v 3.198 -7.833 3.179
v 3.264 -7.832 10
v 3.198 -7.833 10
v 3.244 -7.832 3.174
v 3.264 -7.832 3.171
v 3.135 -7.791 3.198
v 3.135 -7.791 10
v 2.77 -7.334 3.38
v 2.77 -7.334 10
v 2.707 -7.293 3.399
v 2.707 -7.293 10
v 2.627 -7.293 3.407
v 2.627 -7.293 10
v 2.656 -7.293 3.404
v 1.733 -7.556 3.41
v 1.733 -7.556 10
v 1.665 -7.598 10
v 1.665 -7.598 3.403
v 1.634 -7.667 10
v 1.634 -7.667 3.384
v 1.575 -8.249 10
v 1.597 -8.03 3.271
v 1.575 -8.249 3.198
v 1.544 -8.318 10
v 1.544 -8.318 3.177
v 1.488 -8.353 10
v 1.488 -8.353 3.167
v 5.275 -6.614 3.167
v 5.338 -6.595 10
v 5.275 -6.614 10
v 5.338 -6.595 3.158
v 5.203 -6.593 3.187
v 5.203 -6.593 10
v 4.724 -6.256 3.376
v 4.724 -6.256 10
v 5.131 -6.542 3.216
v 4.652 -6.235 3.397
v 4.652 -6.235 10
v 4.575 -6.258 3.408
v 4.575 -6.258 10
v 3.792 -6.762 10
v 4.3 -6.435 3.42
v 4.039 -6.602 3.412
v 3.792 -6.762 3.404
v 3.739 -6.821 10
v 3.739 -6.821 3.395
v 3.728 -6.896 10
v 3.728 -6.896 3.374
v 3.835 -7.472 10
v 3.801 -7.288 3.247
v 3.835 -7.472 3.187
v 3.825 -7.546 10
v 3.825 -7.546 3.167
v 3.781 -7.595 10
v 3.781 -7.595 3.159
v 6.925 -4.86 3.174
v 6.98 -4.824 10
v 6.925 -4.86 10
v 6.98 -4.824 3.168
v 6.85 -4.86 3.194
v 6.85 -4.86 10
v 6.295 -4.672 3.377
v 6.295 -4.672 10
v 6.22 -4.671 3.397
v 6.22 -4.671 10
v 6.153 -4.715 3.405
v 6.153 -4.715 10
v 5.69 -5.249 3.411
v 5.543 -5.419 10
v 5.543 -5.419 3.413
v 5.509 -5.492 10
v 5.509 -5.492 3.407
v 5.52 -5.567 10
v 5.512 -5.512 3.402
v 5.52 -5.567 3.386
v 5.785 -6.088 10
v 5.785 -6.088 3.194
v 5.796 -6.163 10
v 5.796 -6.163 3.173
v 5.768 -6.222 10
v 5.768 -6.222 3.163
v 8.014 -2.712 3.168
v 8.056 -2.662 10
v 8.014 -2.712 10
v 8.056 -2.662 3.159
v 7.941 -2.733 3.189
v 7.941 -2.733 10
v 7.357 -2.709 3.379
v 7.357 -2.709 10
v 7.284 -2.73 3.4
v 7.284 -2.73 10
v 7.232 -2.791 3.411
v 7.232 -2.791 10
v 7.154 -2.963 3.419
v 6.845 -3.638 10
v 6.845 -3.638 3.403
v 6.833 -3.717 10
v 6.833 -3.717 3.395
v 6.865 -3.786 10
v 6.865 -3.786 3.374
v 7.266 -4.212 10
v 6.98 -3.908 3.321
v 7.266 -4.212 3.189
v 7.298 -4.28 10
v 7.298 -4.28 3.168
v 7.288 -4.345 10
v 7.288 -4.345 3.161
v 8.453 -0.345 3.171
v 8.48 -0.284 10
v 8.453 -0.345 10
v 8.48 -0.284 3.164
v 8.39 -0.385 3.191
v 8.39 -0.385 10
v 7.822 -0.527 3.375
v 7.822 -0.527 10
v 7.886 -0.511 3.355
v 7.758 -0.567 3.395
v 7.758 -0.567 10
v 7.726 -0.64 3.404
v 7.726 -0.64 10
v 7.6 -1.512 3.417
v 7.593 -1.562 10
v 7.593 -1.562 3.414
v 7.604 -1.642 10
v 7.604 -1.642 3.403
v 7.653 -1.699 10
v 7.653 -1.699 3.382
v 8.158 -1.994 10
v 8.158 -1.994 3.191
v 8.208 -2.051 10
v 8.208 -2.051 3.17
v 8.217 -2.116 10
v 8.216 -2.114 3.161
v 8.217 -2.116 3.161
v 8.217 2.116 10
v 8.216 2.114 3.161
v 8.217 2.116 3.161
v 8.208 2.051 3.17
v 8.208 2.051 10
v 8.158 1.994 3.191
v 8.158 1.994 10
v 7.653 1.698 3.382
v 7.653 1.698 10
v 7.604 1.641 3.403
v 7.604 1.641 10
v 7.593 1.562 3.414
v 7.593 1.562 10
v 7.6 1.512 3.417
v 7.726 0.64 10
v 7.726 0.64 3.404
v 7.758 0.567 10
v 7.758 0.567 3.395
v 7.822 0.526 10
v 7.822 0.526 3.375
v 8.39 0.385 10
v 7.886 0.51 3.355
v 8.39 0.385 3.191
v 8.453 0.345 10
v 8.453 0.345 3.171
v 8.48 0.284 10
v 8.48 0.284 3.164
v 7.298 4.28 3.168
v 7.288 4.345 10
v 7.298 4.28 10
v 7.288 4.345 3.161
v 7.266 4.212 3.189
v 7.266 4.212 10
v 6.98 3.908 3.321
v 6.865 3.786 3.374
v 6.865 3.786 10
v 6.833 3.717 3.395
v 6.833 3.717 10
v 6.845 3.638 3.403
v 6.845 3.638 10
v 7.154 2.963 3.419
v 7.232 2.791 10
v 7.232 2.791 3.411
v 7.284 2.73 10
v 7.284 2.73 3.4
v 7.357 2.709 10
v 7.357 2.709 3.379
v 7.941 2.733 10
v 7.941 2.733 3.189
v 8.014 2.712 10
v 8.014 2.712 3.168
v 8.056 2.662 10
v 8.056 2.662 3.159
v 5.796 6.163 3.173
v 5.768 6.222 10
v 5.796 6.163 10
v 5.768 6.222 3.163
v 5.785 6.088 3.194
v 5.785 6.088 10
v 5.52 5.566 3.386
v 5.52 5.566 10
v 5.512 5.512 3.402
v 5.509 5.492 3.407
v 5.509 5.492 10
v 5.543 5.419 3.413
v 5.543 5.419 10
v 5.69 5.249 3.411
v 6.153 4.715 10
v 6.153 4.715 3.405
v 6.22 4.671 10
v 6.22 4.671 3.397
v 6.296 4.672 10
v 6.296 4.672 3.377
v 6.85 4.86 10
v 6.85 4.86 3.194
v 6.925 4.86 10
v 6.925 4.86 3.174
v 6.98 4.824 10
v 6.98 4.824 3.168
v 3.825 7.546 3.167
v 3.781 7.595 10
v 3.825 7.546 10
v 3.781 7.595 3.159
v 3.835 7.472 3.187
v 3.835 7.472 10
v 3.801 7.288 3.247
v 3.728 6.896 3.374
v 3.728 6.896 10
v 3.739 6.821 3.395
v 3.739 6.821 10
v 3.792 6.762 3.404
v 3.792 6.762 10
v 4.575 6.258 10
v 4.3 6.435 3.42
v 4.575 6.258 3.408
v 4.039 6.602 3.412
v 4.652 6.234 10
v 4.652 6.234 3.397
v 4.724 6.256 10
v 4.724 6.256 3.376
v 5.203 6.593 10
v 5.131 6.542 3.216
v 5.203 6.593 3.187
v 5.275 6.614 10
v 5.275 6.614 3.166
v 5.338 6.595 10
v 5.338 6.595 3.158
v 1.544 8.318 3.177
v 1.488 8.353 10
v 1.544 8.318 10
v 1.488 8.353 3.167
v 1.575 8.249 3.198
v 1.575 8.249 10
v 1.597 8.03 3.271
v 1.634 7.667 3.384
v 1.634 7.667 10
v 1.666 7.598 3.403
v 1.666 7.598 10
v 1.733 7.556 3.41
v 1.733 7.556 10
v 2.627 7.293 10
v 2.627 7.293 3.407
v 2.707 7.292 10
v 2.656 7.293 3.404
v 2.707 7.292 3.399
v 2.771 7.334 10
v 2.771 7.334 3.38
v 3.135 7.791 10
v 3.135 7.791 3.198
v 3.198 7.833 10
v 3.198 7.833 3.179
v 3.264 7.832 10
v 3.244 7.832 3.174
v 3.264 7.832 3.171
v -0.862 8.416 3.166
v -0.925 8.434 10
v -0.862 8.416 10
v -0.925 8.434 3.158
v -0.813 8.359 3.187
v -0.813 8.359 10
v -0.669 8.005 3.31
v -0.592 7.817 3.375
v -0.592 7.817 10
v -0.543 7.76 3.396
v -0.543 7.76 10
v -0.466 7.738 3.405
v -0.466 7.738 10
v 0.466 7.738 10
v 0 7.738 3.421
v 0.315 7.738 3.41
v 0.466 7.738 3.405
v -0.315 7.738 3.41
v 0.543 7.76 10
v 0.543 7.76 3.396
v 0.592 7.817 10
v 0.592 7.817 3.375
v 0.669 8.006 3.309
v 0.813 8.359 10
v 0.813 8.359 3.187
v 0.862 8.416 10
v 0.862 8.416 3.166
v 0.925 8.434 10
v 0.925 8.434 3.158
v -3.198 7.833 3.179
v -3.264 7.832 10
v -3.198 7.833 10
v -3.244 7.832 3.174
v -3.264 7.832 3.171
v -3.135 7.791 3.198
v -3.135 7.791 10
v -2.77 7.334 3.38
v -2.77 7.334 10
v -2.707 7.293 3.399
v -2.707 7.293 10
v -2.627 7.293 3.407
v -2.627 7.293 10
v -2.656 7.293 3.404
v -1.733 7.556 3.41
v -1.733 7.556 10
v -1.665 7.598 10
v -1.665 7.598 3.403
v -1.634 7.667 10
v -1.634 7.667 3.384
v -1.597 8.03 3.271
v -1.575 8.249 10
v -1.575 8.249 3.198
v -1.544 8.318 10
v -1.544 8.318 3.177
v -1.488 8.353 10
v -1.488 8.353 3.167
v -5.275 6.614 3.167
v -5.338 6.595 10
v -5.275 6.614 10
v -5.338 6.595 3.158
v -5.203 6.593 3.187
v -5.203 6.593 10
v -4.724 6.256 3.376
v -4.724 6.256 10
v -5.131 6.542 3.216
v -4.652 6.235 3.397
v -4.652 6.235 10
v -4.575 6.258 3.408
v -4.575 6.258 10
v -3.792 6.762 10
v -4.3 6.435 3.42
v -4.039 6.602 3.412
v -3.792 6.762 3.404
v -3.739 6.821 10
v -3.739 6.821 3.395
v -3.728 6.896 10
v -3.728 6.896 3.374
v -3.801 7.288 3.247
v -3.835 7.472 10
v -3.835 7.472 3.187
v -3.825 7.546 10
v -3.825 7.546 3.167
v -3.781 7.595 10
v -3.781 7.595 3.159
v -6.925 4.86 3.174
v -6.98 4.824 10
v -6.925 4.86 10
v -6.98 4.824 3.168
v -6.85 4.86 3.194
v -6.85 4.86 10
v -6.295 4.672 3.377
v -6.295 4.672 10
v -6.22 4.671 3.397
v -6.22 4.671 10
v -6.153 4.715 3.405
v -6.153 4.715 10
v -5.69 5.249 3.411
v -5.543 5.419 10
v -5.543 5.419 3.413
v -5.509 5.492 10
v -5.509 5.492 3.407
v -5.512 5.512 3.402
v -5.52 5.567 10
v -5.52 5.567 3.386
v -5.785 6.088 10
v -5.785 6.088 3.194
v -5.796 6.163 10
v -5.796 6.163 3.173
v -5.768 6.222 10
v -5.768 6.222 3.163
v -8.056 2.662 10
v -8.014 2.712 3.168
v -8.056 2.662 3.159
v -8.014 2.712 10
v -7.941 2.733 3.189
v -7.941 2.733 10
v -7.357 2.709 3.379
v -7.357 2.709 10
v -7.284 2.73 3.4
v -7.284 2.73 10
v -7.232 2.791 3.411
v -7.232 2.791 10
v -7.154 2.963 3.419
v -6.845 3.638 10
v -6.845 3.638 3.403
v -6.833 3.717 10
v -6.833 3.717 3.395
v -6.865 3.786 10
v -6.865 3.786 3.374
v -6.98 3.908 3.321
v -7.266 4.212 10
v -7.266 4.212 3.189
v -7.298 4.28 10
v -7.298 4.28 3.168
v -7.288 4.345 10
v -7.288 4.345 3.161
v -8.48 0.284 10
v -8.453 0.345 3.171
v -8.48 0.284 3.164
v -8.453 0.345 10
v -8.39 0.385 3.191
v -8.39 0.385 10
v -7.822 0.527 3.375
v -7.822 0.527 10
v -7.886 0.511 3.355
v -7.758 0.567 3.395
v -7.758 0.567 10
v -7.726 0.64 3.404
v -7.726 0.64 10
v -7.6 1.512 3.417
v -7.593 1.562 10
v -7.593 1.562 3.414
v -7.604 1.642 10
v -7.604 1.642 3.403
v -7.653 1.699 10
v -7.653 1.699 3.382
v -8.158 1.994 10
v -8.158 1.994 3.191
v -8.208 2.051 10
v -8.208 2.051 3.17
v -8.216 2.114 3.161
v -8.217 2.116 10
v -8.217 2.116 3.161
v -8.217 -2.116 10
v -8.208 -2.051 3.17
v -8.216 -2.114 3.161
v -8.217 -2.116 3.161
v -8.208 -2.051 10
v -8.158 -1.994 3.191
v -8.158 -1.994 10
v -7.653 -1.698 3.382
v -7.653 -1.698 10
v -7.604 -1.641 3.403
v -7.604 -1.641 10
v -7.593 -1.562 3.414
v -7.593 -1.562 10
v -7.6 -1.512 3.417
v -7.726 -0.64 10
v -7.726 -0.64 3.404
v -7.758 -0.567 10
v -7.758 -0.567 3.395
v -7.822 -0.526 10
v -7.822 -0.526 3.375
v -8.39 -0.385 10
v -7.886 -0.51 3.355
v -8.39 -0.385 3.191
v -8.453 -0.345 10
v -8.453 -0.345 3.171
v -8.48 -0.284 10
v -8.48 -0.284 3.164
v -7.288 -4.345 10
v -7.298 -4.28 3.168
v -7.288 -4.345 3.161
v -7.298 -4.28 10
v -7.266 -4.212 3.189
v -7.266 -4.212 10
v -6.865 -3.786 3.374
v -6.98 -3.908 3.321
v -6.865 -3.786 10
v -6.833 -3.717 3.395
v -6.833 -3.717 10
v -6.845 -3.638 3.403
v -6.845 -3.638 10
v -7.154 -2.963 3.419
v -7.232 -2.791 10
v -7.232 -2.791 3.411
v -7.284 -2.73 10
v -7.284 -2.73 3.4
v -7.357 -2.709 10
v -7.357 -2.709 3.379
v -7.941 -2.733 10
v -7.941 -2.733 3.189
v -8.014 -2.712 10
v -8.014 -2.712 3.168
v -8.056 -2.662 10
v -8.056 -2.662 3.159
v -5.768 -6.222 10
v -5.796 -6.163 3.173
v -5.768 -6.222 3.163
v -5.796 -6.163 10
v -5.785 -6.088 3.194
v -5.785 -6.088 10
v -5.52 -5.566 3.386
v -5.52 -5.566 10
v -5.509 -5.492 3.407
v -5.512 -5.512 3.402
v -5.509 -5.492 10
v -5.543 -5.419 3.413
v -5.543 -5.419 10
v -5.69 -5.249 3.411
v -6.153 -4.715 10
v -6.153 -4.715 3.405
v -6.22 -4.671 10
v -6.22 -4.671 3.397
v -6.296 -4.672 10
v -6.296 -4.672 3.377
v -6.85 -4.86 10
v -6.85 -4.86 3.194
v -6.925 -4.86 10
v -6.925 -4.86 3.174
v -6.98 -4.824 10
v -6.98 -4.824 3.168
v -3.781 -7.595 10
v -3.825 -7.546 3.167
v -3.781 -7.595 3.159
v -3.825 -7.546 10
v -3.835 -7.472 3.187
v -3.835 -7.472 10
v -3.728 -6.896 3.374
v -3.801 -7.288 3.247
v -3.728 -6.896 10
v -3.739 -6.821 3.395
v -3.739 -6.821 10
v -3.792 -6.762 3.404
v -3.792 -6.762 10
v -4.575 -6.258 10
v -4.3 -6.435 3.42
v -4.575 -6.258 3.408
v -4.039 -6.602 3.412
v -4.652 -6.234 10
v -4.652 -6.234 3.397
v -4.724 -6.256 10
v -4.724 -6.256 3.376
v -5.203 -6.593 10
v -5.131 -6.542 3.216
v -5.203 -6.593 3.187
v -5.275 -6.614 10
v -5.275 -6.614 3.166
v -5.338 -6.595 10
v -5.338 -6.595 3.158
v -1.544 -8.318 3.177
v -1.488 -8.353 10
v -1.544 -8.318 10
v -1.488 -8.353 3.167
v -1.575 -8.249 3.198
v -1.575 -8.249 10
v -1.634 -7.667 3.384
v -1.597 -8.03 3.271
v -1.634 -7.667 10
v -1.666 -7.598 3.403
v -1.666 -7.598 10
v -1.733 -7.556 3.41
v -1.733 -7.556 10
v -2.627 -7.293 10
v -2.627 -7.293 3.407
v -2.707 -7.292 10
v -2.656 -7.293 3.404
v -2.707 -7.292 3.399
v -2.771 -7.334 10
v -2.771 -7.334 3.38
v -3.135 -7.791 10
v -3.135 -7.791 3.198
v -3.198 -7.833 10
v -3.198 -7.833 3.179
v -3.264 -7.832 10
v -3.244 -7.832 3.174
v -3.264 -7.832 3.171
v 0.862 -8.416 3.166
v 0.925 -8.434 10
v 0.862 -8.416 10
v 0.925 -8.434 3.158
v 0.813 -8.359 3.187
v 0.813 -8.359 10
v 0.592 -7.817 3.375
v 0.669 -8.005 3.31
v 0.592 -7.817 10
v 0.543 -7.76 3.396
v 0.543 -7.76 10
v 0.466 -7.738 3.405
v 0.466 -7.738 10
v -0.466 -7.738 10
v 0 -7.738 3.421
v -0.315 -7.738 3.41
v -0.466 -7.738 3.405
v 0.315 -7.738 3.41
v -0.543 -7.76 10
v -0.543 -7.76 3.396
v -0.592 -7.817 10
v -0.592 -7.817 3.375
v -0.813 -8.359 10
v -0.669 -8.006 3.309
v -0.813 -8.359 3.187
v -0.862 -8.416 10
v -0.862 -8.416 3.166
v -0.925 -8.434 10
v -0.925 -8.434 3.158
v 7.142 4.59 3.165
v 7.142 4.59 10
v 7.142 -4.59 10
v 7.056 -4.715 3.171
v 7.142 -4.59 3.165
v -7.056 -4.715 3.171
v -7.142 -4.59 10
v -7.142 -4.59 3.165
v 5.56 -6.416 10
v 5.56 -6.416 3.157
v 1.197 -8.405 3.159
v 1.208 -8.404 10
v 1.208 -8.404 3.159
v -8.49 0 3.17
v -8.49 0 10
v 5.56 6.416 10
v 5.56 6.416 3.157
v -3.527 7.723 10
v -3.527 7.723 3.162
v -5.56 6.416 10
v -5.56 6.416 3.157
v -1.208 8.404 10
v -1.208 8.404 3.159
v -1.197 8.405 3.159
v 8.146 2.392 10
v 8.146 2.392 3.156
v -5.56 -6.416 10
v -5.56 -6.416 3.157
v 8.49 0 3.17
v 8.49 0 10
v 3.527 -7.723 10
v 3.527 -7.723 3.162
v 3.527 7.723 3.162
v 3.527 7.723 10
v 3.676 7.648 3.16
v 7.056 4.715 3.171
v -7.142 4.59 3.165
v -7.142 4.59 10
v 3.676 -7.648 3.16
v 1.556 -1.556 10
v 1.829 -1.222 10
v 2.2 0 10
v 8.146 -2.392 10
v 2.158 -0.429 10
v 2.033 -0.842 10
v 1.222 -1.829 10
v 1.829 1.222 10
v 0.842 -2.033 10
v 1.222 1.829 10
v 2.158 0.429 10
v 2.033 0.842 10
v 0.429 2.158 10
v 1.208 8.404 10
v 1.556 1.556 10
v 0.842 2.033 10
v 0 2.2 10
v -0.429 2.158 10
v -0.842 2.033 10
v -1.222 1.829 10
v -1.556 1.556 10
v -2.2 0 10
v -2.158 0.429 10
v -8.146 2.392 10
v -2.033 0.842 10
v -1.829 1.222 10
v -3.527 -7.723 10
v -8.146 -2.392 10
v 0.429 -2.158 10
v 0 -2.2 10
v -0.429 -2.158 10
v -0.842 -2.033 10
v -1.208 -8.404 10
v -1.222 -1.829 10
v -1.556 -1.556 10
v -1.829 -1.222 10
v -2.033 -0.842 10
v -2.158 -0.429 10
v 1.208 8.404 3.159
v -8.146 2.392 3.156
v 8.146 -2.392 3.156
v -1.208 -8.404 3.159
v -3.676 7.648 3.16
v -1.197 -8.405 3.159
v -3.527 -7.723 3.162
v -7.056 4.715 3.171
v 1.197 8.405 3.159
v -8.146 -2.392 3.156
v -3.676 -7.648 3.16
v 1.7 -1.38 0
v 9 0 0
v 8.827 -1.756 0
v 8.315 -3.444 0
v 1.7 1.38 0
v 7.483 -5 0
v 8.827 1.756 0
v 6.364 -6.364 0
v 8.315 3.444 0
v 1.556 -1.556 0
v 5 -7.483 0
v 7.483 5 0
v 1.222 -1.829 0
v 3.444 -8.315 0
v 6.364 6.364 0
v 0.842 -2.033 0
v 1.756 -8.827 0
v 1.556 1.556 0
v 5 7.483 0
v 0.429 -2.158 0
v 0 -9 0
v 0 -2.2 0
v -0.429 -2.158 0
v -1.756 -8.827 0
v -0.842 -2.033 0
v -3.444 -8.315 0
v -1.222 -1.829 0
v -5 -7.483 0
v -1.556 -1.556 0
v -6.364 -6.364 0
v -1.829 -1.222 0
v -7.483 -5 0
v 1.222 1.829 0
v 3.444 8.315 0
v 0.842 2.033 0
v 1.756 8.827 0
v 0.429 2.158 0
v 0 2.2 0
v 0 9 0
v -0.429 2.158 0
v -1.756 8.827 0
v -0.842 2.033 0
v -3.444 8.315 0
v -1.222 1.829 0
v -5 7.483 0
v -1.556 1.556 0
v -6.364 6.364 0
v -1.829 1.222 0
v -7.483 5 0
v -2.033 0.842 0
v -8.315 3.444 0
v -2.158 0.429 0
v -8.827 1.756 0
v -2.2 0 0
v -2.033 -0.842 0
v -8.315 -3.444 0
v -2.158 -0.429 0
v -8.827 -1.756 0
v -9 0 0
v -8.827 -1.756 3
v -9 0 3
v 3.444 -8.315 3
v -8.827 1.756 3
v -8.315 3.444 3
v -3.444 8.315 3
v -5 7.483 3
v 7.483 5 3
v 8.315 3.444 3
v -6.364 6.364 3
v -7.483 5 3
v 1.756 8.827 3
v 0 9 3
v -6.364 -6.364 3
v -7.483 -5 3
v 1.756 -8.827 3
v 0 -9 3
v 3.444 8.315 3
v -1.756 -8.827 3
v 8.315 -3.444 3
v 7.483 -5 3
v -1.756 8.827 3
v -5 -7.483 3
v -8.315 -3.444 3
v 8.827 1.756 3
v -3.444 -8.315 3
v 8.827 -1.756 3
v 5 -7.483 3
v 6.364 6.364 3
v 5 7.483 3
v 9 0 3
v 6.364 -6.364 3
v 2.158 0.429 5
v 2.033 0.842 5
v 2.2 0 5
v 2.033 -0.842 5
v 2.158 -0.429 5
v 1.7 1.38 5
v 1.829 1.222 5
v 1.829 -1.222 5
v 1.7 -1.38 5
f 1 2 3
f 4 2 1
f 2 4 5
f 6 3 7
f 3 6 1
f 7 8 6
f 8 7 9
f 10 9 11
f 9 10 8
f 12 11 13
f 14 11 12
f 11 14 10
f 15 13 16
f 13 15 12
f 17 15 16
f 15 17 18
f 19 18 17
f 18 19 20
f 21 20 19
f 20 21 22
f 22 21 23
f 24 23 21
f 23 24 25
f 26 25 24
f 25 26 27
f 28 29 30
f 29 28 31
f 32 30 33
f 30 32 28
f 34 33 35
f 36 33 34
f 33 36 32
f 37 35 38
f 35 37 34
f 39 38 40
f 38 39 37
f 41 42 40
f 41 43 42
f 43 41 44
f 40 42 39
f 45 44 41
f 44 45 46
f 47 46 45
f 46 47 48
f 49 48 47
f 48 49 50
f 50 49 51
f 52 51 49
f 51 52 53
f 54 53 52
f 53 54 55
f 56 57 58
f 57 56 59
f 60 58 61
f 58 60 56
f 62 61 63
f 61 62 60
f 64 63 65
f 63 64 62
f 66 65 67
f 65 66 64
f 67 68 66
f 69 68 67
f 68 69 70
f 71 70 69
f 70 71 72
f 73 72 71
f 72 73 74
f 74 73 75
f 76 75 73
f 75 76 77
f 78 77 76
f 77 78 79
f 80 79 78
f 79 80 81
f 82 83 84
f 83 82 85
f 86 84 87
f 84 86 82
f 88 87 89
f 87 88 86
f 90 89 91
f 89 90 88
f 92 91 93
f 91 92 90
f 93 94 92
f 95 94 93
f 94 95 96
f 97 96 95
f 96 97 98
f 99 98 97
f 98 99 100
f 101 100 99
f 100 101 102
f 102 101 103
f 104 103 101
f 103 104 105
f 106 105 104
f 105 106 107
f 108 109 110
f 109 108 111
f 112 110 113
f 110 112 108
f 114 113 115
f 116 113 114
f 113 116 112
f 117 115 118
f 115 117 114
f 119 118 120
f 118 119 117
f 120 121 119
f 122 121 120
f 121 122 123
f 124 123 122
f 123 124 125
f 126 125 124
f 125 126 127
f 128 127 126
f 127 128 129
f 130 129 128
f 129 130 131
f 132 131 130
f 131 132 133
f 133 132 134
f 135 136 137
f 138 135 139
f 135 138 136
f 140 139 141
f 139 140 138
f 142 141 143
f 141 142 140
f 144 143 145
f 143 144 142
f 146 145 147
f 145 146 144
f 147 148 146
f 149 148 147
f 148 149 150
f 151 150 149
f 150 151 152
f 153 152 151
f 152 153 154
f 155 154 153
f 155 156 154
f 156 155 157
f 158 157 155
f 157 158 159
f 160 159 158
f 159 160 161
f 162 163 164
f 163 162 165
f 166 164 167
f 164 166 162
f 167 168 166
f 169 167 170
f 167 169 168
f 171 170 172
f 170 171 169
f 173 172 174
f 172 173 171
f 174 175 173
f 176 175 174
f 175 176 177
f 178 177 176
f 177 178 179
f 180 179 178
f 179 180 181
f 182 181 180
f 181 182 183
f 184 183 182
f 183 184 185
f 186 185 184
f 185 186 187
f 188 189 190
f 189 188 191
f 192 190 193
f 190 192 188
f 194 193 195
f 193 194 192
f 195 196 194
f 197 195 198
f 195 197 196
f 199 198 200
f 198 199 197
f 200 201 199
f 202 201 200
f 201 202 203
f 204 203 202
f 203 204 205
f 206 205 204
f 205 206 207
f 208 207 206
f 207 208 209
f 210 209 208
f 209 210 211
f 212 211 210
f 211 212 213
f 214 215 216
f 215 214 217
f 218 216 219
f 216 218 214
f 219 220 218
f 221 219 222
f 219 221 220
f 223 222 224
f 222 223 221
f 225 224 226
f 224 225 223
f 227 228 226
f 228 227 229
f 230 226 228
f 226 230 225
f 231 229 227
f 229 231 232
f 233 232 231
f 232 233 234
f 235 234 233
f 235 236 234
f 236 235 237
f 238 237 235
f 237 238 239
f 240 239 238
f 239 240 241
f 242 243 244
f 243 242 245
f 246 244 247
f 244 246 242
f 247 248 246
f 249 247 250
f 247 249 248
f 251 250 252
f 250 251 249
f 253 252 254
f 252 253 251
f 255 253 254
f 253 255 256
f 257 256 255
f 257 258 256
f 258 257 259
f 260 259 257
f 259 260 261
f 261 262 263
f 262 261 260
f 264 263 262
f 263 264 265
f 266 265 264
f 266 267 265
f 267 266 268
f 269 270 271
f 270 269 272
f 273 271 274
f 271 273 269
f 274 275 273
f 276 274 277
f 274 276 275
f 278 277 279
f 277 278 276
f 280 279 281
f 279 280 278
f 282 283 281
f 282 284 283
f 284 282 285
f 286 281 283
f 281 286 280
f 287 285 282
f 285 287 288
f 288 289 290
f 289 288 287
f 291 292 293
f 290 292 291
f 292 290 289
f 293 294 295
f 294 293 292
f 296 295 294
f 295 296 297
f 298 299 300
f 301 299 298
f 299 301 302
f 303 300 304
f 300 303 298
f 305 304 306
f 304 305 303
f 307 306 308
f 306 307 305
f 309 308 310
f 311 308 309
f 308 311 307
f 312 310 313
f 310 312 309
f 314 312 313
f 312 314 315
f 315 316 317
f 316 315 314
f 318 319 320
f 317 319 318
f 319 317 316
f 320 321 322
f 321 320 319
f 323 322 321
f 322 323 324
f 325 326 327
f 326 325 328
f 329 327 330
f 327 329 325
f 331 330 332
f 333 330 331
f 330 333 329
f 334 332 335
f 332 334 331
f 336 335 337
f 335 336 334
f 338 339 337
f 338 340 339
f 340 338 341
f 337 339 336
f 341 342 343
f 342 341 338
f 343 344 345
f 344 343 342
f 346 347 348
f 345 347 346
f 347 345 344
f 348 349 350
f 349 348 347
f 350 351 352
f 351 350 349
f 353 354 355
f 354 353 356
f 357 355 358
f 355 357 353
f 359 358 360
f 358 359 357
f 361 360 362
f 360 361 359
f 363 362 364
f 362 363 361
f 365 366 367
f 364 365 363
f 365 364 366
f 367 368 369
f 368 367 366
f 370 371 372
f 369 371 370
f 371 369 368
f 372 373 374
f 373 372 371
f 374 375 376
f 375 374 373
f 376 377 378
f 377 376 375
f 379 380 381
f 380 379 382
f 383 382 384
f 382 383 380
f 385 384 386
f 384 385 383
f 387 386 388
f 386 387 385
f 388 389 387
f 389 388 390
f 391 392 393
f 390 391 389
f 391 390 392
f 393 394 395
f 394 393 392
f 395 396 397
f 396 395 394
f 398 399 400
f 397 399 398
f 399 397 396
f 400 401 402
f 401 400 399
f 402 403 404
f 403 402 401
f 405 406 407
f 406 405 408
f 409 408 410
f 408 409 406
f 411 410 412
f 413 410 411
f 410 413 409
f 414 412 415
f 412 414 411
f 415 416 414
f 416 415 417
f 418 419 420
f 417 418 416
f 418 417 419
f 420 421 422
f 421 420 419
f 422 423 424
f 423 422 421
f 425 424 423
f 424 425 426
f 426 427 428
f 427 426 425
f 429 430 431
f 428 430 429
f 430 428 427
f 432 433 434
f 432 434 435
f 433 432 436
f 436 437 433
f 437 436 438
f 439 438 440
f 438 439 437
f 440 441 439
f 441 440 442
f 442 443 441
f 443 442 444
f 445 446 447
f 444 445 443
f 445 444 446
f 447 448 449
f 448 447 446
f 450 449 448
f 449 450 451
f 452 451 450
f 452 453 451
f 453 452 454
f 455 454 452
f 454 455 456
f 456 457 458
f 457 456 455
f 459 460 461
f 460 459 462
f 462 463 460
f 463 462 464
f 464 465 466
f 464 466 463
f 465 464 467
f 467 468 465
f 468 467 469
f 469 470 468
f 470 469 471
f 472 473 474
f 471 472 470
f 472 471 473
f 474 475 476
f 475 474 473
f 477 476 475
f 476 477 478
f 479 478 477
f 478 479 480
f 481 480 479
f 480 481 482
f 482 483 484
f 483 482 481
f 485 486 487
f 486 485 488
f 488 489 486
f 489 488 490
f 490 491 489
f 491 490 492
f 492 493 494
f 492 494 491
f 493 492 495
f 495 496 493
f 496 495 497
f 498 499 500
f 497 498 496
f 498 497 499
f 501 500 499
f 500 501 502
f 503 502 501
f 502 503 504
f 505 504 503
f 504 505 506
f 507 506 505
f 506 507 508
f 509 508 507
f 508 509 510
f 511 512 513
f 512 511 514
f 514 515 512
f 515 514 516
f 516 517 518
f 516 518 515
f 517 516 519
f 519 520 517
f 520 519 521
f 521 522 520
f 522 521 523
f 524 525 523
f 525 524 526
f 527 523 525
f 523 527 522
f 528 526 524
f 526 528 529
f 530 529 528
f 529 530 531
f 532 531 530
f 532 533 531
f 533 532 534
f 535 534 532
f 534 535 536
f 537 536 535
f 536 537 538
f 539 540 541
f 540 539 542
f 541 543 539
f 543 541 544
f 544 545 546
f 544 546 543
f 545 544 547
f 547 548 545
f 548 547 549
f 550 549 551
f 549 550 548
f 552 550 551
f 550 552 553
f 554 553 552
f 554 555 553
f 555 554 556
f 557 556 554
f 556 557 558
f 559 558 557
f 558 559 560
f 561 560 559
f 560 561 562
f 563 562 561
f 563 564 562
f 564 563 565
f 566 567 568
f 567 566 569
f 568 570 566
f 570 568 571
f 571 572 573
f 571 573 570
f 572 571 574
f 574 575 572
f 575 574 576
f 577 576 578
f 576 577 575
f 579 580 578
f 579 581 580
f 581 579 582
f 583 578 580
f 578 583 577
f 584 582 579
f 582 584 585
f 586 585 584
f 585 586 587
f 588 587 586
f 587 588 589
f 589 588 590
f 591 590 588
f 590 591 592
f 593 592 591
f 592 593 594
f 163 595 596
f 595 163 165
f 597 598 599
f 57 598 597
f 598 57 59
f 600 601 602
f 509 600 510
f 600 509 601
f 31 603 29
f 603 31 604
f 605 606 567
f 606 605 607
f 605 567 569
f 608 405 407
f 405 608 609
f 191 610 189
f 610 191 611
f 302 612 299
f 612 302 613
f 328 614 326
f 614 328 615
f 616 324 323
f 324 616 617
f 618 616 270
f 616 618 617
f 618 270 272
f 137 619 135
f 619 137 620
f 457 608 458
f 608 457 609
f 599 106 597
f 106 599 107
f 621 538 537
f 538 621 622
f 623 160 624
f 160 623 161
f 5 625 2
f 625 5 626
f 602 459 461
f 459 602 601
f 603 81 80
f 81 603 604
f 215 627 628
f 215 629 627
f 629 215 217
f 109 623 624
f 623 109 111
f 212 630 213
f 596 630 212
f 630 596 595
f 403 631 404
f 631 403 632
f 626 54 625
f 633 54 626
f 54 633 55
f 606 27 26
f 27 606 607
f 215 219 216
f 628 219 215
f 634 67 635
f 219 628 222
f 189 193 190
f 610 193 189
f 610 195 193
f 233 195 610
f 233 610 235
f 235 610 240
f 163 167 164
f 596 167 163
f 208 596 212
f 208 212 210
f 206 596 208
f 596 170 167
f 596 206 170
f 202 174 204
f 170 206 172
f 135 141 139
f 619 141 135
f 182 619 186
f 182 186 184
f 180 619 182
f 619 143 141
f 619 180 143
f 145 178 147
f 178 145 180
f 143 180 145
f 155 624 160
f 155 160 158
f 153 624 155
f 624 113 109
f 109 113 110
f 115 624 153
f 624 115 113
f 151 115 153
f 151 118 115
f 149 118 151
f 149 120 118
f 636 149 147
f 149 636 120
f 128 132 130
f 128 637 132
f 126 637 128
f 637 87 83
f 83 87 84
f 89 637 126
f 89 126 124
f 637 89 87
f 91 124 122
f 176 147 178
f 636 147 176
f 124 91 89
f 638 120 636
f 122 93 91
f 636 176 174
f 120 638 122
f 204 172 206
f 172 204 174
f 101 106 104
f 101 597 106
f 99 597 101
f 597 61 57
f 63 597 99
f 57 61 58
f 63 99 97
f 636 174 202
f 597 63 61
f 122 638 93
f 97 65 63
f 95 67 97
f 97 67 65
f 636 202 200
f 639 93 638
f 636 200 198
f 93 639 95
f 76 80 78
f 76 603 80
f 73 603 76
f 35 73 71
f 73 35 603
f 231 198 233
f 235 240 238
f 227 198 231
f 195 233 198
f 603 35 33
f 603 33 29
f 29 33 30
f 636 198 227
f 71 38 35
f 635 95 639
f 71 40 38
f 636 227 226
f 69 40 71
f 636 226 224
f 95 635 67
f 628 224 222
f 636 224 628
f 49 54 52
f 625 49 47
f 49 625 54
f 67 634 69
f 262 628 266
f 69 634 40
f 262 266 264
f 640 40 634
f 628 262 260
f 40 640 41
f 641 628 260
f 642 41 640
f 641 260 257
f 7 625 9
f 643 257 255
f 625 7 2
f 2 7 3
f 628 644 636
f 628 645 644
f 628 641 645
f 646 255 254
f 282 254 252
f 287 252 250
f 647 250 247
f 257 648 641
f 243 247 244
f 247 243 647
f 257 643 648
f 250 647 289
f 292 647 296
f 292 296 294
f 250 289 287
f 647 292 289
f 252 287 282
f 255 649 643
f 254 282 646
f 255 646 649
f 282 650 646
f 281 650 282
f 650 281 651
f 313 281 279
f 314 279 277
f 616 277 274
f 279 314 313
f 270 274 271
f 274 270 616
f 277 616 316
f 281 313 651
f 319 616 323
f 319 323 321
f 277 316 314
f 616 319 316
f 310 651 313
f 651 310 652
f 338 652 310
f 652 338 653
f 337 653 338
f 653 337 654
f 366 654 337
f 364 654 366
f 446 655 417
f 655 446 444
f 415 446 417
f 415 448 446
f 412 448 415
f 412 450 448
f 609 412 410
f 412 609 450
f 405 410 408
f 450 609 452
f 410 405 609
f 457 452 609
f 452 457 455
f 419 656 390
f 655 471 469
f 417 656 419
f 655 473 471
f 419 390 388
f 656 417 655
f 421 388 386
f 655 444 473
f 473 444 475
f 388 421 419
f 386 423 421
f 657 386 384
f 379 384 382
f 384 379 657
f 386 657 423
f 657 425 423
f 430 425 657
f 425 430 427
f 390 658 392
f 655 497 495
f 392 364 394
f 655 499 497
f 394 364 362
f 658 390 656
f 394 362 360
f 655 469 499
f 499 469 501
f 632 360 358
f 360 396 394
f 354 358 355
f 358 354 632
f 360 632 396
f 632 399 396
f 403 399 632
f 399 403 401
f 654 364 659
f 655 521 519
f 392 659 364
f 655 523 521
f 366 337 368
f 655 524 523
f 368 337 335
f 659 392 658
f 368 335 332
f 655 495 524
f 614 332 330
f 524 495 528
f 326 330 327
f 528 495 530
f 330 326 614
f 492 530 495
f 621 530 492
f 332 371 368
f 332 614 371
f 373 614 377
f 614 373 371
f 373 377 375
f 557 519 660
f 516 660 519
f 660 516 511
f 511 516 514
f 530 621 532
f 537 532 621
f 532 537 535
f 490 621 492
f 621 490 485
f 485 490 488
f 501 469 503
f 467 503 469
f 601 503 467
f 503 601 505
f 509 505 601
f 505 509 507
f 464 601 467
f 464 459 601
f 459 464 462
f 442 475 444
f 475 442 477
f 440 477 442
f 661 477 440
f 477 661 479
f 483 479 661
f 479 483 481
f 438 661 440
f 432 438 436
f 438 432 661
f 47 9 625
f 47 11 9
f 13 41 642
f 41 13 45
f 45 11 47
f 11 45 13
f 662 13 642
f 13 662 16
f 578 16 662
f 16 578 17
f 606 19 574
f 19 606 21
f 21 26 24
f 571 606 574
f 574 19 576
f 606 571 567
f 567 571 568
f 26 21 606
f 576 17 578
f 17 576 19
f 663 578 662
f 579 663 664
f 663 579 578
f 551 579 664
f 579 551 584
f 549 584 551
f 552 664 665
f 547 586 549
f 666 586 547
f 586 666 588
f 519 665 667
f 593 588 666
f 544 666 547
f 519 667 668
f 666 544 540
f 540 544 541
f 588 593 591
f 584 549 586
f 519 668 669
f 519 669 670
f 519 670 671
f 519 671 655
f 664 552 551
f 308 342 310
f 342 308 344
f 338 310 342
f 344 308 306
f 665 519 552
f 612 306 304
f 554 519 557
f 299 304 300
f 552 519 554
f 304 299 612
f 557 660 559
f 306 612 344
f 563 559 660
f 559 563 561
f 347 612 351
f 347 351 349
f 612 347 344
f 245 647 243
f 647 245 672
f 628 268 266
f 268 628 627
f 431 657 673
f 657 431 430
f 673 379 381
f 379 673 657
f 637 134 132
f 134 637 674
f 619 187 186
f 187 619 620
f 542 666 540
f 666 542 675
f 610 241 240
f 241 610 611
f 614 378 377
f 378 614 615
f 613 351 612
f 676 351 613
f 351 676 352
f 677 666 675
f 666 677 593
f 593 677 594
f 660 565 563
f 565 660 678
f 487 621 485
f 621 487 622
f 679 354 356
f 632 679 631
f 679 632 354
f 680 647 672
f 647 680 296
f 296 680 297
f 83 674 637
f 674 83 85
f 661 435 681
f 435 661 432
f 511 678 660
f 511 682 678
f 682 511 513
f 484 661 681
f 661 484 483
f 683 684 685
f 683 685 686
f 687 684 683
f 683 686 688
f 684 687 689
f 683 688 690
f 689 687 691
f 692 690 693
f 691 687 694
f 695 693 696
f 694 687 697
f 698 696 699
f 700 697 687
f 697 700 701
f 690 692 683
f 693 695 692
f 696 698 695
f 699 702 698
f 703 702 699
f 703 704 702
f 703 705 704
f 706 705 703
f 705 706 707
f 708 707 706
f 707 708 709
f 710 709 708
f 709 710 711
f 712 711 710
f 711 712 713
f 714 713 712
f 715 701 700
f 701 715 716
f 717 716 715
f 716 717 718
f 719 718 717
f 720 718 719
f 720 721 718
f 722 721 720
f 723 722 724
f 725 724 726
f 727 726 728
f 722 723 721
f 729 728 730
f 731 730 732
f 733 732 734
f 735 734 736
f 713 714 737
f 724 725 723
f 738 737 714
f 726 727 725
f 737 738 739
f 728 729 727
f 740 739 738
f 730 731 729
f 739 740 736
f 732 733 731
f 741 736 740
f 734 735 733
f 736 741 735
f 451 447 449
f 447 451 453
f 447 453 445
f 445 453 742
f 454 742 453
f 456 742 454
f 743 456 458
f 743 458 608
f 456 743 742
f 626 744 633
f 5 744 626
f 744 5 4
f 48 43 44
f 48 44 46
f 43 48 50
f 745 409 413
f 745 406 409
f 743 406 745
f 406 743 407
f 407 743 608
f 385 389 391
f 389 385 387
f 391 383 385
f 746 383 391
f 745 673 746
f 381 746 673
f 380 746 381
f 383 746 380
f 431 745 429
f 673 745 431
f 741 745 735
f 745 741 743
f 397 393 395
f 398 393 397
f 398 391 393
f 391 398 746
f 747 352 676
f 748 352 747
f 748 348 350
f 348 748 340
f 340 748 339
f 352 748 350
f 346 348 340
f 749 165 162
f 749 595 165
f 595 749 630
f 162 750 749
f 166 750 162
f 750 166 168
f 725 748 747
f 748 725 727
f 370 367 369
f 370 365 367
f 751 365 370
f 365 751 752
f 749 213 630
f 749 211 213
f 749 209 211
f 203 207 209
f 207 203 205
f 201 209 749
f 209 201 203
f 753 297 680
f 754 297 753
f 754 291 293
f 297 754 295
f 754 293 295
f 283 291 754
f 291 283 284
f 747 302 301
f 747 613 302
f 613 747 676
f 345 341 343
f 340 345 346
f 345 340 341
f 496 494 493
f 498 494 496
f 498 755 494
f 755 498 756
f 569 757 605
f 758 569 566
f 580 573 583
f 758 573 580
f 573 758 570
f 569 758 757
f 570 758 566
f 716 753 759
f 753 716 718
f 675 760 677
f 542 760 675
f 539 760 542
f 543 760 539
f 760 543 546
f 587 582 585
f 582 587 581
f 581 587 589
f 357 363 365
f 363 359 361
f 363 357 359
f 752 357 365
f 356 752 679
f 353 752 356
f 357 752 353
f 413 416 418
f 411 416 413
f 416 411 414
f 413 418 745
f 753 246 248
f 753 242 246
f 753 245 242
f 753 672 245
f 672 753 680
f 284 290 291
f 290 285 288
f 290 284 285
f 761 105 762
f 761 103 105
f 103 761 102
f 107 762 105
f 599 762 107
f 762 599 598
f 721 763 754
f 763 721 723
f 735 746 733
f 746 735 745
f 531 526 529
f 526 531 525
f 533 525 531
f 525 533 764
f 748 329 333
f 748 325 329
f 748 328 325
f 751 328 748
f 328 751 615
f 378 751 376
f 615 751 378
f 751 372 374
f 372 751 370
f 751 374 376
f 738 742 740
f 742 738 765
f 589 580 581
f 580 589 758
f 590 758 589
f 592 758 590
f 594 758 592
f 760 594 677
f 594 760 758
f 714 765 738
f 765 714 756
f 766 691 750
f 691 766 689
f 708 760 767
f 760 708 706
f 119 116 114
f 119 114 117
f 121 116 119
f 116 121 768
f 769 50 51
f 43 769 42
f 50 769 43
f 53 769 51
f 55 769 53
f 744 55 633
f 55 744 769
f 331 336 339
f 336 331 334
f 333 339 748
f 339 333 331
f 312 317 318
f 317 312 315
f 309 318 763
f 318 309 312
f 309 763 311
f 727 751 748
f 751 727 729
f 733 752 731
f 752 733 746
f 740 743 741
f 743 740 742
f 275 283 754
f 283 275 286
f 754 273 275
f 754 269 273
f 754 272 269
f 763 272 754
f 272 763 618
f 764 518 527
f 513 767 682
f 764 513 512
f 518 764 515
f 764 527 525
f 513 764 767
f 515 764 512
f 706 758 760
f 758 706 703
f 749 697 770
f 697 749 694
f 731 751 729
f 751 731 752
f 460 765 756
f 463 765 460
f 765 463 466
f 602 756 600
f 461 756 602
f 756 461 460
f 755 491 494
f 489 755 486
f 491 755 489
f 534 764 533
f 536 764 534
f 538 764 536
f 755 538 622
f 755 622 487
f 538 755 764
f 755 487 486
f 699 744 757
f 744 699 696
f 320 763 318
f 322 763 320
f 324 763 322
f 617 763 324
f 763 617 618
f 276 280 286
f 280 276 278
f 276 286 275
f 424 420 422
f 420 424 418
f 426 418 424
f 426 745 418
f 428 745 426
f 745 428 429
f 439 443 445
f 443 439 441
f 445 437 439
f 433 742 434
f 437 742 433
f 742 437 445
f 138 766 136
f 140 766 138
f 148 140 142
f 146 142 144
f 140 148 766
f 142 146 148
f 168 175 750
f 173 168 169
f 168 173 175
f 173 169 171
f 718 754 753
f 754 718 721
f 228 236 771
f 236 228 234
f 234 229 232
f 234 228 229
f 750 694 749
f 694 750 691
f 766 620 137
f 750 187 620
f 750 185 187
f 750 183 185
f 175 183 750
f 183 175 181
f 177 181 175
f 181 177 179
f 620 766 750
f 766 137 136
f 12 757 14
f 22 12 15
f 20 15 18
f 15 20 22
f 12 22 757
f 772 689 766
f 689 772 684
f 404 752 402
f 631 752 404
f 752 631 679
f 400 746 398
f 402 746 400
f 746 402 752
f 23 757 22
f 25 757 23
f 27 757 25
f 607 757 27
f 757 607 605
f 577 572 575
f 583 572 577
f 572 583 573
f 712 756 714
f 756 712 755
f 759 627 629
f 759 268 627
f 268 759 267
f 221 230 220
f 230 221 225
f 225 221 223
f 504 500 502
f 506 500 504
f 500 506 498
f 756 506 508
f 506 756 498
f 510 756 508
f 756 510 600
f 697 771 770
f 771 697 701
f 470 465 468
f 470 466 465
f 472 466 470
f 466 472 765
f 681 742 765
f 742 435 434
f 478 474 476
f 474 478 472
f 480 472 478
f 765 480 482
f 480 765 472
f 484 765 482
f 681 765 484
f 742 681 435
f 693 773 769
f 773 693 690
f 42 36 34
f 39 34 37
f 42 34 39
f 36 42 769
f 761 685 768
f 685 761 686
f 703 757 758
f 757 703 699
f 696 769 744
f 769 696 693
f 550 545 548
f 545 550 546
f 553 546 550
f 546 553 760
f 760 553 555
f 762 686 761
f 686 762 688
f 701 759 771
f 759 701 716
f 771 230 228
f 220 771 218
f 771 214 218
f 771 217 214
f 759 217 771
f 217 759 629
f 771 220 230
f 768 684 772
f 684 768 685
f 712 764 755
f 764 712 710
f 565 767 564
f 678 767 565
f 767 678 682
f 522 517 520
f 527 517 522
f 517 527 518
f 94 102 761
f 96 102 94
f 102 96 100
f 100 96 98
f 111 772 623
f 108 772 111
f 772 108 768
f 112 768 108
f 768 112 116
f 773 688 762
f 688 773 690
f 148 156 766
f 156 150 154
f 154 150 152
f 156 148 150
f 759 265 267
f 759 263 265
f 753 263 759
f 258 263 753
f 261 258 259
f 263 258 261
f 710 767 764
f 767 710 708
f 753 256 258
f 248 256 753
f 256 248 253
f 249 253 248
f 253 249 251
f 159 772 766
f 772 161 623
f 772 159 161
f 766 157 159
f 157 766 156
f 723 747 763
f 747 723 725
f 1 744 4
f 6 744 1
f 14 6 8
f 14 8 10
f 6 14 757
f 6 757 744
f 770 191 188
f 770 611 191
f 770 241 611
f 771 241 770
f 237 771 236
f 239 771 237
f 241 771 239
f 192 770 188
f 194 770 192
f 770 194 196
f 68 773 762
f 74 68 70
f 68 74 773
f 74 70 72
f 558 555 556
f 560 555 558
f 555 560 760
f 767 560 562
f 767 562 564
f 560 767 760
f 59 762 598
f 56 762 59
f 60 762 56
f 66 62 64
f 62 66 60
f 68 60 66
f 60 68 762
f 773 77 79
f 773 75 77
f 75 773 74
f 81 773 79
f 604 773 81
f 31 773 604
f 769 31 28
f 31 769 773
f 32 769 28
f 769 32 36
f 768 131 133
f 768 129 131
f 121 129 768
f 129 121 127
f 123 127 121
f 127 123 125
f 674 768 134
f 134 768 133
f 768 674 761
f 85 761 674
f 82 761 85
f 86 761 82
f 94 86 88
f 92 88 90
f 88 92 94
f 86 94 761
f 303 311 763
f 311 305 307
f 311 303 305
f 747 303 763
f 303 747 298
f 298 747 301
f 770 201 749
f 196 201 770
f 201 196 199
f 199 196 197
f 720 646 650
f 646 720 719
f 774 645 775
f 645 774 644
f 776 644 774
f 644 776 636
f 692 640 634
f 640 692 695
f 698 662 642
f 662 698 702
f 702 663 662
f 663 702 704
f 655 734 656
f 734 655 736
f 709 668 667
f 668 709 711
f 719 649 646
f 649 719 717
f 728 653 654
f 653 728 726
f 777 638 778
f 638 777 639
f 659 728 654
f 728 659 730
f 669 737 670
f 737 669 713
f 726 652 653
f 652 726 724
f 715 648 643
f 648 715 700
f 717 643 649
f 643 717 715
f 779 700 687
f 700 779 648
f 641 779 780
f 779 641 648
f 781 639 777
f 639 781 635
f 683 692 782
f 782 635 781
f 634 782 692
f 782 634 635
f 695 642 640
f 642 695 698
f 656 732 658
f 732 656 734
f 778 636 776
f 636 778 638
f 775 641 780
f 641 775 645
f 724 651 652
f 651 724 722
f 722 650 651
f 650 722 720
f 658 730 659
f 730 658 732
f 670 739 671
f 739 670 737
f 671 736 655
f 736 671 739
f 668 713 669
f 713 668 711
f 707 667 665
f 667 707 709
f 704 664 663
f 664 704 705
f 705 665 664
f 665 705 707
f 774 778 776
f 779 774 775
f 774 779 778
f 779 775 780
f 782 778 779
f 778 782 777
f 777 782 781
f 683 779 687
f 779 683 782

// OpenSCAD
$fn = 32;
teeth = 22; // 64,68mm
motor_shaft = 1;
pulley_t_ht = 10;

include <Pulley_T-MXL-XL-HTD-GT2_N-tooth.scad>;

shaft_radius = 4.4/2;


difference() {
	union() {
		pulley ( "T2.5" , T2_5_pulley_dia , 0.7 , 1.678);
		hull() {
			cylinder(r=15/2,h=3.5);
			cylinder(r=18/2,h=3);
		}
	}

	difference() {
		translate([0,0,-1]) cylinder(r=shaft_radius,h=20);
		translate([5+1.7,0,0]) cube([10,10,10],center=true);	
	}	
}	
